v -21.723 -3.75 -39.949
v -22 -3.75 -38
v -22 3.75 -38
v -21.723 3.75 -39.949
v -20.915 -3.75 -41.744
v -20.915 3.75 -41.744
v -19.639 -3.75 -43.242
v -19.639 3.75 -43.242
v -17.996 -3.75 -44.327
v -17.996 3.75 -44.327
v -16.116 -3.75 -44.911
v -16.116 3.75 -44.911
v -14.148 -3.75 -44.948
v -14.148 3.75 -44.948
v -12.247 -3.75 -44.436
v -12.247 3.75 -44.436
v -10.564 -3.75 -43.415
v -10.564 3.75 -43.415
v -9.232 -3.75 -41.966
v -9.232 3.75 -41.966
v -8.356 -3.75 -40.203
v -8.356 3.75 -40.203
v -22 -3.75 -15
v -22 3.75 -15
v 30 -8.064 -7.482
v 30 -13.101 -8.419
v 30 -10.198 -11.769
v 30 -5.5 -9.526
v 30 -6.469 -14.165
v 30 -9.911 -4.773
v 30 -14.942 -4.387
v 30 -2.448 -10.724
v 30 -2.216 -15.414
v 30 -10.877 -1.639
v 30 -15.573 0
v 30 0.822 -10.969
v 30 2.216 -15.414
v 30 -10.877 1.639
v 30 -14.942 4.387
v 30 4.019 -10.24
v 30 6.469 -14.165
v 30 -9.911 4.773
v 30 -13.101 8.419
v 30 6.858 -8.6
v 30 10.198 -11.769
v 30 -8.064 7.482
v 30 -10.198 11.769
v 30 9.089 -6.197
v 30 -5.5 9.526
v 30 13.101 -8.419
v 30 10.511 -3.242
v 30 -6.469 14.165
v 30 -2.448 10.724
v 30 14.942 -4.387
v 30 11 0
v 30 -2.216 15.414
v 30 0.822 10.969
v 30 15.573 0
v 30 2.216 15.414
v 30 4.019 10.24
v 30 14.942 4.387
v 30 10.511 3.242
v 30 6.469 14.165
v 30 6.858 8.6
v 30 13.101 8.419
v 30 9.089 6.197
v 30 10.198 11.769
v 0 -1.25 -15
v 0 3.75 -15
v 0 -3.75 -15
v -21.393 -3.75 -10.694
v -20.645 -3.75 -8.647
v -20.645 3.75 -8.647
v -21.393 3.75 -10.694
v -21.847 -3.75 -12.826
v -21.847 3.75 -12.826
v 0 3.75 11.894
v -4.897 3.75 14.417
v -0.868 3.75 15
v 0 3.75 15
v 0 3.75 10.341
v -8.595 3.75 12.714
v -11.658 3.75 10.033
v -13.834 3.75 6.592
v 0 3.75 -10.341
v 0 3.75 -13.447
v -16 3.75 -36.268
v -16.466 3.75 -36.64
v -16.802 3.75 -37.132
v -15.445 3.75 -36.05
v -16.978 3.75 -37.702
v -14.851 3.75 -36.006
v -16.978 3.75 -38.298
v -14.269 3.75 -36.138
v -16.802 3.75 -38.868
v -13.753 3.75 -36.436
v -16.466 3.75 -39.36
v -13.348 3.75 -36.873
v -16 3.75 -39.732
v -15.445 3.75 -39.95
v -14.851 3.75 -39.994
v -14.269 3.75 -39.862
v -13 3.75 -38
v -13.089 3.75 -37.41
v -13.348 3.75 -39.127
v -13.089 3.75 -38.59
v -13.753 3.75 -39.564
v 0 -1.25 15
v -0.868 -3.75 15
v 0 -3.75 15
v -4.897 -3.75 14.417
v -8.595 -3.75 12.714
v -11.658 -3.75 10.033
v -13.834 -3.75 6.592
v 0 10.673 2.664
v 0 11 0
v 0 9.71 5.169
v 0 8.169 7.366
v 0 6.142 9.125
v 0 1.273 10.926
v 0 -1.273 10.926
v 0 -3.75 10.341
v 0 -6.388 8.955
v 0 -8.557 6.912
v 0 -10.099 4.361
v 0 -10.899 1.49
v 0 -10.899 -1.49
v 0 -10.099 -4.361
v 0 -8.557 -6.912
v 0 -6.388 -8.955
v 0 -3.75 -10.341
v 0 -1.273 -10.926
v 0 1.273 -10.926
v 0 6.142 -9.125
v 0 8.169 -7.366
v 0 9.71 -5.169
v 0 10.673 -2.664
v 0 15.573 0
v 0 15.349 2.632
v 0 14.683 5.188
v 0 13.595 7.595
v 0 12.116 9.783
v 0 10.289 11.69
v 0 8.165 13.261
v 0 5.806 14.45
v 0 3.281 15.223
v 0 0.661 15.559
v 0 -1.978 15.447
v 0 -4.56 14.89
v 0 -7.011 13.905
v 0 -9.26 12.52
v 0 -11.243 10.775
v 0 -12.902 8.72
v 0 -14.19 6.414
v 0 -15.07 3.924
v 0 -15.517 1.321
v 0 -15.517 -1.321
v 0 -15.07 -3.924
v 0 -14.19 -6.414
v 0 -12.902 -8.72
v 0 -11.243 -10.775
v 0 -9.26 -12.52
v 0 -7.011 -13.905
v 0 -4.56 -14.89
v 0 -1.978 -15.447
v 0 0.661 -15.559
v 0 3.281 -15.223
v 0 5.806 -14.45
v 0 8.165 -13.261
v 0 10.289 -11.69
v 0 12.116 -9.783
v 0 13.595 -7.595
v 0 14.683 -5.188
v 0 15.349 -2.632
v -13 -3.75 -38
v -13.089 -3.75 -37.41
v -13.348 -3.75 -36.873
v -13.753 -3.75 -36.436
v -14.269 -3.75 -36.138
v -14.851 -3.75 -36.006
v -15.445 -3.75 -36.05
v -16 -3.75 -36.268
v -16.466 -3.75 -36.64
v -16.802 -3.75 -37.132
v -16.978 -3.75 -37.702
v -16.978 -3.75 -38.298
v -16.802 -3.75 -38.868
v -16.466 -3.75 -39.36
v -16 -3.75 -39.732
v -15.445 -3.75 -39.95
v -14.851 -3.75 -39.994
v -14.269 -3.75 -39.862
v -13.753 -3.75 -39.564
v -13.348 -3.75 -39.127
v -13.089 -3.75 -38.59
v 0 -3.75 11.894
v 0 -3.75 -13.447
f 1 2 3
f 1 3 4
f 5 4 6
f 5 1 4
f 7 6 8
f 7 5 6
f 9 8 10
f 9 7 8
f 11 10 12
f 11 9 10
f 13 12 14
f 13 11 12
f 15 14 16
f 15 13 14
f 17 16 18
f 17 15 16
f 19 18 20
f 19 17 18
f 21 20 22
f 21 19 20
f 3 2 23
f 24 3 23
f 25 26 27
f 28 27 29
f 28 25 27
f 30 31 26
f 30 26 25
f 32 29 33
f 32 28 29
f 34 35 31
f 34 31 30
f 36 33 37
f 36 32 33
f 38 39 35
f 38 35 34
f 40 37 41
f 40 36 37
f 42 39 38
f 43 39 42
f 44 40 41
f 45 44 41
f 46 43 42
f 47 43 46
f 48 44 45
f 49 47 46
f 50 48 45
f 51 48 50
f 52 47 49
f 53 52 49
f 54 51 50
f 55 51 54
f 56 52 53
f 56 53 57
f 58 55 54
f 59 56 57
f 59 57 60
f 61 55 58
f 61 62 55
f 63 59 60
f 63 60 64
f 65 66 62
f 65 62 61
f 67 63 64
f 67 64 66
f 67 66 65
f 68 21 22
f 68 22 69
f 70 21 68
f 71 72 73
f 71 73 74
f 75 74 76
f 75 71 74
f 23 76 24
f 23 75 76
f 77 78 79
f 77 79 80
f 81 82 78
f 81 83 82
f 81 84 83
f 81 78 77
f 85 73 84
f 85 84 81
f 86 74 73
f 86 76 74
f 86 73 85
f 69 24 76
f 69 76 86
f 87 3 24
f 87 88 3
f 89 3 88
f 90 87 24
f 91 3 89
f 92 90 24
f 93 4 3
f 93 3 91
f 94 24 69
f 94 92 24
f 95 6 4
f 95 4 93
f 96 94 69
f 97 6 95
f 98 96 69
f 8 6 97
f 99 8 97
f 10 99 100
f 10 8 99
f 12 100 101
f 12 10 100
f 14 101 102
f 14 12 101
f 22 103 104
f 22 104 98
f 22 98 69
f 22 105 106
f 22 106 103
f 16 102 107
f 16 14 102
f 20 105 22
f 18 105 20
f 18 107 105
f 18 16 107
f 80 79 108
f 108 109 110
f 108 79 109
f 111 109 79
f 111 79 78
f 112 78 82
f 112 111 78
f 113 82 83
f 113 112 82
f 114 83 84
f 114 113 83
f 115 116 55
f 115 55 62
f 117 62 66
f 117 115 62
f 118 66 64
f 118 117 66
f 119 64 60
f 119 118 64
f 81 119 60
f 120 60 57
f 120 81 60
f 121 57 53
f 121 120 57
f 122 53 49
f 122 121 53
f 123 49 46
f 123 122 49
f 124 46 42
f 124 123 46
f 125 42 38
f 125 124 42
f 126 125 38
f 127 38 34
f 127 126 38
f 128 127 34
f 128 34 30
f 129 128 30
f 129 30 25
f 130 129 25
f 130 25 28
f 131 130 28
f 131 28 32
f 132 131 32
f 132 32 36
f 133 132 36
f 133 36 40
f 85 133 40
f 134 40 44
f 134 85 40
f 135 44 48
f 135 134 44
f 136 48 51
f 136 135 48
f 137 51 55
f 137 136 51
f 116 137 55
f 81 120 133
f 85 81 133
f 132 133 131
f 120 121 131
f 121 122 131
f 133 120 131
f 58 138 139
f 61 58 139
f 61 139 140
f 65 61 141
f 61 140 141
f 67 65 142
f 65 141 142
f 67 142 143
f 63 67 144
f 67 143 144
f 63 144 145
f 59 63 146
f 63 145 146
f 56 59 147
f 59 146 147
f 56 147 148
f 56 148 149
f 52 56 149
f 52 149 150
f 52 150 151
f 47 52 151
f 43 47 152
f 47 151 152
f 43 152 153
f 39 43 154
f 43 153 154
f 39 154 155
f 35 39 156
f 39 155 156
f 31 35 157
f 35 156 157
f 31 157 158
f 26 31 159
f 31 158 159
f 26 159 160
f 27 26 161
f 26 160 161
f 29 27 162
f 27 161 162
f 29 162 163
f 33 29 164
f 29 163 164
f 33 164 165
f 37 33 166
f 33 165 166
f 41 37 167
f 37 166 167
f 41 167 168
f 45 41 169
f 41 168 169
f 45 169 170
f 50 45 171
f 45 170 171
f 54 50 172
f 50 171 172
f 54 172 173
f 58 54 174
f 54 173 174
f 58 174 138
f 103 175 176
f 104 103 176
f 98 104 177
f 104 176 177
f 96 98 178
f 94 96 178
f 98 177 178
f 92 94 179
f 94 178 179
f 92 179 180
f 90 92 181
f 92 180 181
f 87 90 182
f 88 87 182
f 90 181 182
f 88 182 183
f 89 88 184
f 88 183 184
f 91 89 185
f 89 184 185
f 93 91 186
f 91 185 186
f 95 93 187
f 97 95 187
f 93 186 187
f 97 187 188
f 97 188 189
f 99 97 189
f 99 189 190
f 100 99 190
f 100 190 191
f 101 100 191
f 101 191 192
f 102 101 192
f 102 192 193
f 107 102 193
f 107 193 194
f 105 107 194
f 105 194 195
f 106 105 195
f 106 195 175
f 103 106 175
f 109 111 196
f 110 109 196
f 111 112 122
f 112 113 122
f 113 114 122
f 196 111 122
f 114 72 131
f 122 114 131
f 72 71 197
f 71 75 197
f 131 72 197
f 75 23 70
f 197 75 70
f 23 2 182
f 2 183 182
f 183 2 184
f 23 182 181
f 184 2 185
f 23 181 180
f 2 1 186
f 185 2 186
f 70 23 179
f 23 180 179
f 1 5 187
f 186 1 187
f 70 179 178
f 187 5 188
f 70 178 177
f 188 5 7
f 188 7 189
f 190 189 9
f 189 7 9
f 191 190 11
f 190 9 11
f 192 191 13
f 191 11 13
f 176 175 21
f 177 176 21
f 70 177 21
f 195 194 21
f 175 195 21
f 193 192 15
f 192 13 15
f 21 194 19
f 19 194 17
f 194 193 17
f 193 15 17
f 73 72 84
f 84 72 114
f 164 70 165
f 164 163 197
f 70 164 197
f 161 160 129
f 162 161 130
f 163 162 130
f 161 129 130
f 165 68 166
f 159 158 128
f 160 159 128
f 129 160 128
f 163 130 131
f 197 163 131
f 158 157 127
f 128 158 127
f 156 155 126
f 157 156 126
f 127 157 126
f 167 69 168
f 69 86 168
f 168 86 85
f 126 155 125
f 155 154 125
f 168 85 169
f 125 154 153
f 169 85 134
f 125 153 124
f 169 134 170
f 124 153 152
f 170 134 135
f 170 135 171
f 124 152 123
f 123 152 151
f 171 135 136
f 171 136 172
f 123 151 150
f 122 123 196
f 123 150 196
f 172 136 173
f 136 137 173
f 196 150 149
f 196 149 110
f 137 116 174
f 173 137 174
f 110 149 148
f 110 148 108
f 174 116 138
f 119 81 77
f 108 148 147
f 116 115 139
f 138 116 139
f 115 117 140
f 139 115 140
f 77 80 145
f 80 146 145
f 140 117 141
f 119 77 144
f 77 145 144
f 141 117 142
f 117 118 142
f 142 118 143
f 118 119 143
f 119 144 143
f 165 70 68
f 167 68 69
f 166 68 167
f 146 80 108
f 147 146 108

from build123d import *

# Parameters (mm, degrees)
RECTANGLE001_W   = 30
RECTANGLE001_H   = 7.5
EXTRUDE003_DEPTH = 60
SKETCH_R         = 2
EXTRUDE002_DEPTH = 15
SKETCH001_R      = 15.572723
SKETCH001_R_2    = 11
EXTRUDE_DEPTH    = 30


with BuildPart() as extrude003:
    # Rectangle001 → Extrude003 (new body)
    with BuildSketch(Plane(origin=(-30, -3.75, -15), x_dir=(1, 0, 0), z_dir=(0, 0, 1))):
        with Locations((15, 3.75)):
            Rectangle(RECTANGLE001_W, RECTANGLE001_H)
    extrude(amount=EXTRUDE003_DEPTH)


with BuildPart() as extrude003_1:
    # Extrude003 placement: moved
    add(extrude003.part.moved(Location((0, 0, -30))))


with BuildPart() as common:
    # Sketch → Extrude002 (new body)
    with BuildSketch(Plane(origin=(0, 0, -15), x_dir=(1, 0, 0), z_dir=(0, -1, 0))):
        with BuildLine():
            Line((-22, -23), (-22, 0))
            ThreePointArc((-20.644937, 6.353045), (-21.657467, 3.247975), (-22, 0))
            Line((-20.644937, 6.353045), (-13.834191, 21.592376))
            ThreePointArc((-0.867585, 30), (-8.594503, 27.714145), (-13.834191, 21.592376))
            Line((-0.867585, 30), (0, 30))
            Line((0, 30), (0, 0))
            Line((-8.355642, -25.202842), (0, 0))
            ThreePointArc((-22, -23), (-16.115683, -29.910517), (-8.355642, -25.202842))
        make_face()
        with Locations((-15, -23)):
            Circle(SKETCH_R, mode=Mode.SUBTRACT)
    extrude(amount=-EXTRUDE002_DEPTH)


with BuildPart() as common_1:
    # Extrude002 placement: moved
    add(common.part.moved(Location((0, -7.5, 0))))

    # Common: intersect Extrude003
    add(extrude003_1.part, mode=Mode.INTERSECT)


with BuildPart() as body:
    # Sketch001 → Extrude (new body)
    with BuildSketch(Plane.YZ):
        Circle(SKETCH001_R)
        Circle(SKETCH001_R_2, mode=Mode.SUBTRACT)
    extrude(amount=EXTRUDE_DEPTH)

    # Fusion: union Common
    add(common_1.part)


solid = body.part
